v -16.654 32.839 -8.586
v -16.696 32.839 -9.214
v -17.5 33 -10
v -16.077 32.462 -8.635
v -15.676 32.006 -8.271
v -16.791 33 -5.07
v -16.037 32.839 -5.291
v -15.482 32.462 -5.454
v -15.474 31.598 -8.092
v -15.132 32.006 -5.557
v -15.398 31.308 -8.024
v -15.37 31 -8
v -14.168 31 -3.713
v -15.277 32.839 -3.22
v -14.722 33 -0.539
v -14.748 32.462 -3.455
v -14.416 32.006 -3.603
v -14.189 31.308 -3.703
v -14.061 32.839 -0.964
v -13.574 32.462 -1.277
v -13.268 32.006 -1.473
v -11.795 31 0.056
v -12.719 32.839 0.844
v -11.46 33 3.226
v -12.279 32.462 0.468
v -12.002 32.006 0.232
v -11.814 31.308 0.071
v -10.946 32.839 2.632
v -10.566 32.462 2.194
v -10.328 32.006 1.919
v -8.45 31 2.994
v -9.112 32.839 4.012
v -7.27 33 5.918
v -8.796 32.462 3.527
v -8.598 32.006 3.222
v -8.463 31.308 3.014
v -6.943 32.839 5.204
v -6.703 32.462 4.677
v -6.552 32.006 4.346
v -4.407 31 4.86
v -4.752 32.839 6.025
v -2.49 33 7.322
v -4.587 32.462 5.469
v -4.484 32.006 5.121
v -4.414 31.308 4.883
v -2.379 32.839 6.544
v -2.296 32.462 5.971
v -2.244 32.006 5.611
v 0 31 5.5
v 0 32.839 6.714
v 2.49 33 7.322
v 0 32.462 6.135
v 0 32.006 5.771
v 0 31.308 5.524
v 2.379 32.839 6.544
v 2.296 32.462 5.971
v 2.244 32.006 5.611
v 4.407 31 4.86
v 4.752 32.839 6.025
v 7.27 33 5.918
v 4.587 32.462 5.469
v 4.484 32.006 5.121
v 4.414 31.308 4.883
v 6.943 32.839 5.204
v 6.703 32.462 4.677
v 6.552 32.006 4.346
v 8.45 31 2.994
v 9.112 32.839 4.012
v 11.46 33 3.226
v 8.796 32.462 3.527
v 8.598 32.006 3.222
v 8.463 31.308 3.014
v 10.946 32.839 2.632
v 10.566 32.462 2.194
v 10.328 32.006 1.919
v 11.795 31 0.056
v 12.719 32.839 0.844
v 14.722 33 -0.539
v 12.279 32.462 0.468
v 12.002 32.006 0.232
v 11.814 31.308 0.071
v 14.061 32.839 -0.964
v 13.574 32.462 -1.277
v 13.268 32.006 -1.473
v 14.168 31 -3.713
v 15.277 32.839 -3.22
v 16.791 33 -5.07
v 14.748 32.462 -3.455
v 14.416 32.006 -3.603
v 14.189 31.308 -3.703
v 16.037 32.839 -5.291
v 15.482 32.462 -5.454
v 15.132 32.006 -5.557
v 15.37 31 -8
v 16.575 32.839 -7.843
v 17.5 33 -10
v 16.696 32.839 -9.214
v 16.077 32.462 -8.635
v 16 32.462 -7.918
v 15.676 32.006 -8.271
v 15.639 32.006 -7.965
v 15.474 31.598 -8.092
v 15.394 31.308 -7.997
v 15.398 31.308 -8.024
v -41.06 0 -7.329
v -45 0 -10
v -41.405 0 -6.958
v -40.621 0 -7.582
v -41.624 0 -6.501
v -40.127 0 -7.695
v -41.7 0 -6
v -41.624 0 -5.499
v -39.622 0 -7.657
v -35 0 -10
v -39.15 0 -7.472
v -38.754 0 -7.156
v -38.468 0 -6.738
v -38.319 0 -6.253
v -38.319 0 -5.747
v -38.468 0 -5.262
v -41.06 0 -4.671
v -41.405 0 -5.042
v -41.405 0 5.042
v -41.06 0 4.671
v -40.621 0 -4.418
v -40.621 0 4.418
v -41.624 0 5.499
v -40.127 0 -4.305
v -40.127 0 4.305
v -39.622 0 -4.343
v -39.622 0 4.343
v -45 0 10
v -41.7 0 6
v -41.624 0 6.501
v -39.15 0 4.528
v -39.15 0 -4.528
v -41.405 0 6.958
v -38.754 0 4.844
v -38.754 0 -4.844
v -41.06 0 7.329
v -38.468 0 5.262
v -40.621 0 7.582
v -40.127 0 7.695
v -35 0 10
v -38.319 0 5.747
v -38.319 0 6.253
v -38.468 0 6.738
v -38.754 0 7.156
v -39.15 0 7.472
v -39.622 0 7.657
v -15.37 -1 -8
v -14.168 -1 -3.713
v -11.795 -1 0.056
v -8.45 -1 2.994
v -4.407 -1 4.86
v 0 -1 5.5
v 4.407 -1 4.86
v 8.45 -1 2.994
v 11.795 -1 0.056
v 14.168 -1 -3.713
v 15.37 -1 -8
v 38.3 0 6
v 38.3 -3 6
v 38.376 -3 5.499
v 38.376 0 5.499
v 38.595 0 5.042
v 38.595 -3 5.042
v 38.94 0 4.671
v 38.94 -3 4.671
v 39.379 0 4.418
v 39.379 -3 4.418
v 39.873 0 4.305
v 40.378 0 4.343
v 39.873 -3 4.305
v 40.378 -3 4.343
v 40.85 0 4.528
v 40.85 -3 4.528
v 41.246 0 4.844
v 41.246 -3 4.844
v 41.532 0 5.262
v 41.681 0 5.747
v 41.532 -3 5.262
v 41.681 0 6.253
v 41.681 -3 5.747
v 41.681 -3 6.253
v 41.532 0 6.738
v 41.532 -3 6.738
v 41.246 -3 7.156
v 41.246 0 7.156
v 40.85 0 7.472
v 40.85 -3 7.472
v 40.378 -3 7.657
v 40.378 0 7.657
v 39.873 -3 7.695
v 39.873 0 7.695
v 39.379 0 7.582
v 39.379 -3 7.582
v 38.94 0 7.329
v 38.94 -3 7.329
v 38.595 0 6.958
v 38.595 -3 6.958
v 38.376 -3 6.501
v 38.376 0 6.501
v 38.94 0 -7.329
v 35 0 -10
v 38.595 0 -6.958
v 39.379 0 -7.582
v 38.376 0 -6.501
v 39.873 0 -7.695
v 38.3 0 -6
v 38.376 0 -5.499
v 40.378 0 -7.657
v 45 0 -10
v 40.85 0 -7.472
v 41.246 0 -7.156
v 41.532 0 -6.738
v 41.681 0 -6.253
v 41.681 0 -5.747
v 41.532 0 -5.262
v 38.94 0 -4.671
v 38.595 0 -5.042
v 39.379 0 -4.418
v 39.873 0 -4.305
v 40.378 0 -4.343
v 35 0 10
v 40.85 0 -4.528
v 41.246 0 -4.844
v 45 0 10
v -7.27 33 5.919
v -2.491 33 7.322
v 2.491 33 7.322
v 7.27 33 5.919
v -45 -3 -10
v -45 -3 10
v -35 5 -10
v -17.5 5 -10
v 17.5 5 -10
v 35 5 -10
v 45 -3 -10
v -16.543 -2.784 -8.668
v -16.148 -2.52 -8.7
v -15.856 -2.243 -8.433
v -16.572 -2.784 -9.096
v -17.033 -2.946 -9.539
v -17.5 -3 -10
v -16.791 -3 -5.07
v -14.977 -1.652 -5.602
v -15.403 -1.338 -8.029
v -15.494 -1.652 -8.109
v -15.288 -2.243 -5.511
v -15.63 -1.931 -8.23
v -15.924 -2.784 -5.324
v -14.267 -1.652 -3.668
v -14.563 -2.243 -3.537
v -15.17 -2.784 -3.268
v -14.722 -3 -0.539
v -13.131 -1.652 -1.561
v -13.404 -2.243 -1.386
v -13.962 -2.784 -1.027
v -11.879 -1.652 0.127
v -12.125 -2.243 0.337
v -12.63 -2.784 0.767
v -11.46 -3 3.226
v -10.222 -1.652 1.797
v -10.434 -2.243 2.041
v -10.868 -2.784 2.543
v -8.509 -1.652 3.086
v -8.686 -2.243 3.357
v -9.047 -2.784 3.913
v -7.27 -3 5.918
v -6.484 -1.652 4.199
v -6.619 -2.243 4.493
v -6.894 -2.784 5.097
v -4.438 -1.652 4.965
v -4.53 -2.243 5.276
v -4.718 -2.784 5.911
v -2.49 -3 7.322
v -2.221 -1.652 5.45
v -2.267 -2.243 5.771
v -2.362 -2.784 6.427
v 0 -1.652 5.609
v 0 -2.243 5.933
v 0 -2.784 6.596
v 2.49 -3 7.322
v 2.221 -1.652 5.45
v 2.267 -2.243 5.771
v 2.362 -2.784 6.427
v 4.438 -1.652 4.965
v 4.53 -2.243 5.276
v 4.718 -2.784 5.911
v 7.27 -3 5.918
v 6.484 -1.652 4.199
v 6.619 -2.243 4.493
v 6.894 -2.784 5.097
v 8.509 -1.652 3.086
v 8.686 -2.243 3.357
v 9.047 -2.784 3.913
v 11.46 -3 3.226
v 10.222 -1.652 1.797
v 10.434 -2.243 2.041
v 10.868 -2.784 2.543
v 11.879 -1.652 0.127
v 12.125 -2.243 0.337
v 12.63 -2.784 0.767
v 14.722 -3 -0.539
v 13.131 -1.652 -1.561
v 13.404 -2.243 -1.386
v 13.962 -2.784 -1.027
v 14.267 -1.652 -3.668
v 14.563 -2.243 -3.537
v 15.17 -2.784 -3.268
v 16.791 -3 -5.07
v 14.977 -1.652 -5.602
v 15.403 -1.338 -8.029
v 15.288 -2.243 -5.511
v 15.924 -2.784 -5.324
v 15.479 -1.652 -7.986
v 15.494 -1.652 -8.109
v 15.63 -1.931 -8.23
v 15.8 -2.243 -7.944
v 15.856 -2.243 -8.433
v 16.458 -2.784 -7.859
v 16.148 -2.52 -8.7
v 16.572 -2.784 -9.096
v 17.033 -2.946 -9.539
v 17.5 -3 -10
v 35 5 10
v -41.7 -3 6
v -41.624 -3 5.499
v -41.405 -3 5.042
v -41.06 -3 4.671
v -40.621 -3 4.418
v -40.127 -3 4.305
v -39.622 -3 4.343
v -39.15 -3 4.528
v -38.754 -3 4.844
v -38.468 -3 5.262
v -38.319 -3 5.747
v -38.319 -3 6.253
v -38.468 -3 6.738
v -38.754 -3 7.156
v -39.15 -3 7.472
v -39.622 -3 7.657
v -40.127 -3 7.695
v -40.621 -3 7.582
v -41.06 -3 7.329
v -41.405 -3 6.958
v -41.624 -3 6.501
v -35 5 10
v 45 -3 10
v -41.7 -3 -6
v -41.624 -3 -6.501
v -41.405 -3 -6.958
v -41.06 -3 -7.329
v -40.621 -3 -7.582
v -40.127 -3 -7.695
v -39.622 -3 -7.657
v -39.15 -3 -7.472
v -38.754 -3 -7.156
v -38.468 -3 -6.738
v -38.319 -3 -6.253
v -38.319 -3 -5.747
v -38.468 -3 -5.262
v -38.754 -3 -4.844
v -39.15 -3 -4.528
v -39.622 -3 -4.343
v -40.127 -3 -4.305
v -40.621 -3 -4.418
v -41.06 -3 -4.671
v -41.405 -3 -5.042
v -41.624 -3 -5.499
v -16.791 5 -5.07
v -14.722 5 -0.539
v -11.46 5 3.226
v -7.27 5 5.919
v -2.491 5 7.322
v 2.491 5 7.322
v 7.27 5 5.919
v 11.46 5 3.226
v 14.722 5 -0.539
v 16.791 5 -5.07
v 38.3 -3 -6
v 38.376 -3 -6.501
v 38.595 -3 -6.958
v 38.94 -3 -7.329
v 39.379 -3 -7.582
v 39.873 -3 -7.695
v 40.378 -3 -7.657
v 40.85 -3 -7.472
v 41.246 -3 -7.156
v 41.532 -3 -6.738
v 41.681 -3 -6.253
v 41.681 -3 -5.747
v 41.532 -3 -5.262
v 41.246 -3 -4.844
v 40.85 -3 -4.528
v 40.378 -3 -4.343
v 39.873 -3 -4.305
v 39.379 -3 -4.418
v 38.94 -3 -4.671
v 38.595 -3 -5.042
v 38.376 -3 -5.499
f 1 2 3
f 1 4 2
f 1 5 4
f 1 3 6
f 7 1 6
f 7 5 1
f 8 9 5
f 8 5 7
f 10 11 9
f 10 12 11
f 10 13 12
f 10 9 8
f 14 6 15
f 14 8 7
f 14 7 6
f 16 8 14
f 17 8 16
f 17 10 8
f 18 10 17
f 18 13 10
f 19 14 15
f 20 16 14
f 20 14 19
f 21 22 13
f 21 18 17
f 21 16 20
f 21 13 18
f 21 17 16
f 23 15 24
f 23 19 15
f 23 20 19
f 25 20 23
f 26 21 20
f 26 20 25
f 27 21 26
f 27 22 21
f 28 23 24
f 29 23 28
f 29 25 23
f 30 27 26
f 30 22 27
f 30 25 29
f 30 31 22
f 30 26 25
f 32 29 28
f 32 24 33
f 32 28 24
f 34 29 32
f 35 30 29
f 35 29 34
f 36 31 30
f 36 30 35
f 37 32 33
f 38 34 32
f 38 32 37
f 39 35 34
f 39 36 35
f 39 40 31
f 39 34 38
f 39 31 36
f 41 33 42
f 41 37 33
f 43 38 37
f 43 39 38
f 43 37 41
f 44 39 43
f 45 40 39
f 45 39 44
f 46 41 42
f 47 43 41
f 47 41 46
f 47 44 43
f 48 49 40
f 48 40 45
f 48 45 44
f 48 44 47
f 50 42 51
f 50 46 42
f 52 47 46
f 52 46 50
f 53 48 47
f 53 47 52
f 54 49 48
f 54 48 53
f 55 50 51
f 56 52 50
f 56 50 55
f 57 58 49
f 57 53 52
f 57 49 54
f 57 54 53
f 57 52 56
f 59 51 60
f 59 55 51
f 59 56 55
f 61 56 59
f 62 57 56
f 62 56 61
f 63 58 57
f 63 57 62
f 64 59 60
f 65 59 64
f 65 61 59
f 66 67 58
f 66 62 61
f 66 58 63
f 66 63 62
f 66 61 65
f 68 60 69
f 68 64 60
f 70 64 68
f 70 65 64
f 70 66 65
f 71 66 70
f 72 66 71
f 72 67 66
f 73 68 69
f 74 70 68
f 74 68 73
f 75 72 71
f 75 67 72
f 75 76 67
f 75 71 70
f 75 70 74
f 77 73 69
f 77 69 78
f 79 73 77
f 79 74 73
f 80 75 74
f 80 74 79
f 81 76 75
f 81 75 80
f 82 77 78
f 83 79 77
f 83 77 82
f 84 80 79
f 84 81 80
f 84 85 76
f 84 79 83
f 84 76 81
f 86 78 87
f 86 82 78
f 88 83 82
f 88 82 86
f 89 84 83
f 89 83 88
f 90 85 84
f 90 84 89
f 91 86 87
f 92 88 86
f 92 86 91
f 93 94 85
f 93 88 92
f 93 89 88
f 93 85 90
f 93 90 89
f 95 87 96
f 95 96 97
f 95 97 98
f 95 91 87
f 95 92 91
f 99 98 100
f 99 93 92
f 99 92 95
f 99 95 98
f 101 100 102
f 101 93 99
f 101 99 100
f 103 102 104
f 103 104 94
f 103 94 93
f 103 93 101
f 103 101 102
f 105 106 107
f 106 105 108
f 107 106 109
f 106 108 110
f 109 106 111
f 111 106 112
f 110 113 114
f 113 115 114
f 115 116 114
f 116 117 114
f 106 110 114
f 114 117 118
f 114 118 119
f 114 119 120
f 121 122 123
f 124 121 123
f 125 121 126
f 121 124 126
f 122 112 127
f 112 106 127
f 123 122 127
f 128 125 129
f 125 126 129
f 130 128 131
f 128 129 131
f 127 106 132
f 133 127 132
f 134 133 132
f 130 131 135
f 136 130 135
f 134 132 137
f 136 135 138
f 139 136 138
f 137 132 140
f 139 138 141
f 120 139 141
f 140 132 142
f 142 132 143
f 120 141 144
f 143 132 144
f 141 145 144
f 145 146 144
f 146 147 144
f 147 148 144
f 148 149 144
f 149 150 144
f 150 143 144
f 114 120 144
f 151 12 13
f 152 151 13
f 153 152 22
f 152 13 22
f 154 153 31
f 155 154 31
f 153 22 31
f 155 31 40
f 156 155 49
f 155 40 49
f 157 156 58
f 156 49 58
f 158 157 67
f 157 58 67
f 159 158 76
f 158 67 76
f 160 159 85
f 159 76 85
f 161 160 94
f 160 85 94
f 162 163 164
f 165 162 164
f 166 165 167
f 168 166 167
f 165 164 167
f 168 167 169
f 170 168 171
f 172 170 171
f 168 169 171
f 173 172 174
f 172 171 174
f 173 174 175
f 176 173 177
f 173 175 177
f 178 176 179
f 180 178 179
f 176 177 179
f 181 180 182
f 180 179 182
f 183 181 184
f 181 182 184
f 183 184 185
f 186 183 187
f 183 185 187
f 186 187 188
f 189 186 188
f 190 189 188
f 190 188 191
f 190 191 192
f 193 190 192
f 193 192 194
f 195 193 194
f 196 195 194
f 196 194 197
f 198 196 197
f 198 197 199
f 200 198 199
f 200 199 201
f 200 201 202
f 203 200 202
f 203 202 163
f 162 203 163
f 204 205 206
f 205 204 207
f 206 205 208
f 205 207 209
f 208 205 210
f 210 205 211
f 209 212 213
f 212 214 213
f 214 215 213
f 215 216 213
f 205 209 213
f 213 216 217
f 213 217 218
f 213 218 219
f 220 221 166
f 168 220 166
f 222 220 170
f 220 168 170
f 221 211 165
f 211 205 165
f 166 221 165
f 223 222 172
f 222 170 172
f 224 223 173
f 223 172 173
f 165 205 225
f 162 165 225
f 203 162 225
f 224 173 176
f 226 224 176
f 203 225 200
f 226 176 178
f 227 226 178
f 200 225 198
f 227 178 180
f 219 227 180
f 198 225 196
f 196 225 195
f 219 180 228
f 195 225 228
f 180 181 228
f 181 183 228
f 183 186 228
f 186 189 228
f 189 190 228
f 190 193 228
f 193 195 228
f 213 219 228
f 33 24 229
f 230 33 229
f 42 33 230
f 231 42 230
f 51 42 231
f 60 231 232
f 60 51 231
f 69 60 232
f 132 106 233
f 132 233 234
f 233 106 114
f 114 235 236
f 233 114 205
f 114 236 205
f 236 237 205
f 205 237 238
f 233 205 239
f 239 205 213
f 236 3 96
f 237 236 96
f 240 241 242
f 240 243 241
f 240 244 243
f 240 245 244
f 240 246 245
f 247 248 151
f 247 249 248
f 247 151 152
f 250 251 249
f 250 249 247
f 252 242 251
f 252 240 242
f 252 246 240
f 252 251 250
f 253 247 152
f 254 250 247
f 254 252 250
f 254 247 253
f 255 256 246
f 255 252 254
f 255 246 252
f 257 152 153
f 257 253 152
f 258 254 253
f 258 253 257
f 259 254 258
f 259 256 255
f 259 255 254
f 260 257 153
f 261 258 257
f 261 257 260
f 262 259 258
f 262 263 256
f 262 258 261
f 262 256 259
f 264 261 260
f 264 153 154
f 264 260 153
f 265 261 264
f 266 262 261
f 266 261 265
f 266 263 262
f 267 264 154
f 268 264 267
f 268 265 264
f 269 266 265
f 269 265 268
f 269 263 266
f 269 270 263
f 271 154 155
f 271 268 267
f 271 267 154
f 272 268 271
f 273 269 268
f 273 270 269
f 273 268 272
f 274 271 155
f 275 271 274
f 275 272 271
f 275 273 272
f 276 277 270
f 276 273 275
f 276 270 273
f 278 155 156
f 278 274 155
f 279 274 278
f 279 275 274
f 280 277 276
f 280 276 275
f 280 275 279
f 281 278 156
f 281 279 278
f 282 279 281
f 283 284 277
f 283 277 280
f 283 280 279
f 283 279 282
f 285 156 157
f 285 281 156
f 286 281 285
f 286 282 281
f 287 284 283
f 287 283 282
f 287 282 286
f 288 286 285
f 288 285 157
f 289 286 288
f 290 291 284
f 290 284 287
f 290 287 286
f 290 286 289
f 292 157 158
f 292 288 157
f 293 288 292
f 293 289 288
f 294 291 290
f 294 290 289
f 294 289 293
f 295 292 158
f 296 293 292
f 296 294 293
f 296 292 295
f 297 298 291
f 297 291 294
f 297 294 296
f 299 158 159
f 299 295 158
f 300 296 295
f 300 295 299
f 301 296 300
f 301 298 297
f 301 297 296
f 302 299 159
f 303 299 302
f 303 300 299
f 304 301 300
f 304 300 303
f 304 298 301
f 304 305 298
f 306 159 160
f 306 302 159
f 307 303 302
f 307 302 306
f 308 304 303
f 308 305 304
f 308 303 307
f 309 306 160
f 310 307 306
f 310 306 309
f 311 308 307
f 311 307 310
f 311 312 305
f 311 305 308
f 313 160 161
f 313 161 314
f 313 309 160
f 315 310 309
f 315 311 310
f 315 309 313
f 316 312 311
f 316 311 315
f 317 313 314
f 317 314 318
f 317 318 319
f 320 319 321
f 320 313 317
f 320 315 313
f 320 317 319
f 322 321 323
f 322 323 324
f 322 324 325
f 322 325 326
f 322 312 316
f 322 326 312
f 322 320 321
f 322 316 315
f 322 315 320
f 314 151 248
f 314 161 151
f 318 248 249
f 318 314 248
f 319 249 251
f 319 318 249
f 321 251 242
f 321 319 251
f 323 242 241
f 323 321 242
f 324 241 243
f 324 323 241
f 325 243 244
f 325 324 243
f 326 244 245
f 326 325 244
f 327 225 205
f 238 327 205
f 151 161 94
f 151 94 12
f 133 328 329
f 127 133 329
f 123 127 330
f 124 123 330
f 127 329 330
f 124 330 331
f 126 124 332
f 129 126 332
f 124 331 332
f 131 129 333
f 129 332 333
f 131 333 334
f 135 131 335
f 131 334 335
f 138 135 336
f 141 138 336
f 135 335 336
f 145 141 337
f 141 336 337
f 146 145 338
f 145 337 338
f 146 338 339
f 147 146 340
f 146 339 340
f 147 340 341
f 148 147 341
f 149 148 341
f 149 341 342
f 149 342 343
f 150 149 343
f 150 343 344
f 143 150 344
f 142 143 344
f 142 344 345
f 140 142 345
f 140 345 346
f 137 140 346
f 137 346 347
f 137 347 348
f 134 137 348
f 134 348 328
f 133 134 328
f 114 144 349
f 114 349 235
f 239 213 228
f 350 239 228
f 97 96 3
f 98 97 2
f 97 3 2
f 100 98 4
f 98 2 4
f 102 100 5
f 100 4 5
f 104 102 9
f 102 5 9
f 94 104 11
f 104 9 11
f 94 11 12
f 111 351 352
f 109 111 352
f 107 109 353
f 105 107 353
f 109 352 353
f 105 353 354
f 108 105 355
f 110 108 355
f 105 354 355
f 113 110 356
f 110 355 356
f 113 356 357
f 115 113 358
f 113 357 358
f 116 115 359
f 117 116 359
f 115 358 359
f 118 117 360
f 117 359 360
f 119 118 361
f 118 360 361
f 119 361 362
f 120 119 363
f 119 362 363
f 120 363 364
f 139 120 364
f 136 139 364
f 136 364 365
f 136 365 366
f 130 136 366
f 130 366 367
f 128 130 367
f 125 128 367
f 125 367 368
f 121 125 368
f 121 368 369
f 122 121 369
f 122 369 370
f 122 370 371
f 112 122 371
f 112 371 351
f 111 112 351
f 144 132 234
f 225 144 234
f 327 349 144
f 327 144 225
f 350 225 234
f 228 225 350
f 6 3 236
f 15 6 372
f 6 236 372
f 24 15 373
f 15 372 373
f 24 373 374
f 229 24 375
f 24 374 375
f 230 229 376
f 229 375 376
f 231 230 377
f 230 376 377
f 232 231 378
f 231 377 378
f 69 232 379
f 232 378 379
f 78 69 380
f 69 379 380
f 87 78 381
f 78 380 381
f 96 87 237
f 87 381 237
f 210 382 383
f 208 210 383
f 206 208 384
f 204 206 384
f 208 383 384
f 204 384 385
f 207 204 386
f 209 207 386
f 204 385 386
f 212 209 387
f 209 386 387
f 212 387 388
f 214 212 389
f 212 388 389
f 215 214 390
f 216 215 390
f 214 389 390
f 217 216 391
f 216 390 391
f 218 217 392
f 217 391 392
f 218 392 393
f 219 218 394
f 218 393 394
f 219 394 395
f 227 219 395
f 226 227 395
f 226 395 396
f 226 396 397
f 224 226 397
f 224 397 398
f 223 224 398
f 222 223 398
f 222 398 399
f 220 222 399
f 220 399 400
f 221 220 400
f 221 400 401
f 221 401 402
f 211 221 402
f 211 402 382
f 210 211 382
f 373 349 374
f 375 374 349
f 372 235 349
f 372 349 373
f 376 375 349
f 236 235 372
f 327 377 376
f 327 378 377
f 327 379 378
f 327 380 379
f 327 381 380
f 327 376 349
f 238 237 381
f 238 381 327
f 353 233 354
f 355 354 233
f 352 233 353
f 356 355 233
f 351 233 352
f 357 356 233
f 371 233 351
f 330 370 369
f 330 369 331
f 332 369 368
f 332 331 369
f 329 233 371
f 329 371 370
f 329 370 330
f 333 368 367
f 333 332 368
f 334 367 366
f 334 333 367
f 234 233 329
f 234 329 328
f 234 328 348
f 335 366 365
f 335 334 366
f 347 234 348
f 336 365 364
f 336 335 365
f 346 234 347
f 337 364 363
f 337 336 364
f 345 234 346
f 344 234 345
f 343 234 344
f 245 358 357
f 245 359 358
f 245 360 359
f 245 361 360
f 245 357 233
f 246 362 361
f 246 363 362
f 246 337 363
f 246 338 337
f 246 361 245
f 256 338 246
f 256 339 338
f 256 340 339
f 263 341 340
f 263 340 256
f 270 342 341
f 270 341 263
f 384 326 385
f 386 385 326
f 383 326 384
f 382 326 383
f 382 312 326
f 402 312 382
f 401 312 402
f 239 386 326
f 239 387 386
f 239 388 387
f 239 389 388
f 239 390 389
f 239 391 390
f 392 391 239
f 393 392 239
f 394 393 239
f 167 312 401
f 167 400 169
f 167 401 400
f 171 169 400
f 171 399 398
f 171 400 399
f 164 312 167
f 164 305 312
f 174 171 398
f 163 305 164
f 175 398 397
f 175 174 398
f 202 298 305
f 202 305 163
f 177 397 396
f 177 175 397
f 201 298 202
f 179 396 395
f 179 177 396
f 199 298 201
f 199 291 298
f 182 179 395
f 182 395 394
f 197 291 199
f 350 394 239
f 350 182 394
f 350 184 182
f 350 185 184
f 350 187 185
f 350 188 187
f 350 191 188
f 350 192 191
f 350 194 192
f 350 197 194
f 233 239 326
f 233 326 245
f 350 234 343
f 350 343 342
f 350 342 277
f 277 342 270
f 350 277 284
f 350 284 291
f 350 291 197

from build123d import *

# Parameters (mm, degrees)
SKETCH1_W                = 70
SKETCH1_H                = 20
BOSS_EXTRUDE1_DEPTH      = 5
SKETCH2_W                = 90
SKETCH2_H                = 20
BOSS_EXTRUDE2_DEPTH      = 3
BOSS_EXTRUDE3_DEPTH      = 28
CUT_EXTRUDE1_DEPTH       = 59.489315264
FILLET1_R                = 2
FILLET2_R                = 2
M3_CLEARANCE_HOLE1_D     = 3.4
M3_CLEARANCE_HOLE1_DEPTH = 10
M3_CLEARANCE_HOLE1_TIP   = 1.021463052


with BuildPart() as part:
    # Sketch1 → Boss-Extrude1 (new body)
    with BuildSketch(Plane(origin=(0, 0, 0), x_dir=(1, 0, 0), z_dir=(0, 1, 0))):
        Rectangle(SKETCH1_W, SKETCH1_H)
    extrude(amount=BOSS_EXTRUDE1_DEPTH)

    # Sketch2 → Boss-Extrude2 (add)
    with BuildSketch(Plane.XZ):
        Rectangle(SKETCH2_W, SKETCH2_H)
    extrude(amount=BOSS_EXTRUDE2_DEPTH)

    # Sketch4 → Boss-Extrude3 (add)
    with BuildSketch(Plane(origin=(0, 5, 0), x_dir=(1, 0, 0), z_dir=(0, 1, 0))):
        with BuildLine():
            Line((17.5, 10), (-17.5, 10))
            ThreePointArc((-17.5, 10), (0, -7.5), (17.5, 10))
        make_face()
    extrude(amount=BOSS_EXTRUDE3_DEPTH)

    # Sketch6 → Cut-Extrude1 (cut, through all)
    with BuildSketch(Plane(origin=(0, 33, 0), x_dir=(1, 0, 0), z_dir=(0, 1, 0))):
        with BuildLine():
            Line((15.370426149, 8), (-15.370426149, 8))
            ThreePointArc((-15.370426149, 8), (0, -5.5), (15.370426149, 8))
        make_face()
    extrude(amount=-CUT_EXTRUDE1_DEPTH, mode=Mode.SUBTRACT)

    # Fillet1
    fillet1_edges = [part.edges().sort_by_distance(p)[0] for p in [
        (0, 33, 5.5),
        (0, 33, -8),
    ]]
    fillet(fillet1_edges, radius=FILLET1_R - 0.0001)  # a hair under: the kernel refuses the full size

    # Fillet2
    fillet2_edges = [part.edges().sort_by_distance(p)[0] for p in [
        (0, -3, 5.5),
        (0, -3, -8),
    ]]
    fillet(fillet2_edges, radius=FILLET2_R - 0.0001)  # a hair under: the kernel refuses the full size

    # M3 Clearance Hole1
    with Locations(Plane(origin=(0, 0, 0), x_dir=(1, 0, 0), z_dir=(0, 1, 0))):
        with Locations((-40, 6), (-40, -6), (40, 6), (40, -6)):
            Hole(M3_CLEARANCE_HOLE1_D / 2, depth=M3_CLEARANCE_HOLE1_DEPTH)
            with Locations((0, 0, -(M3_CLEARANCE_HOLE1_DEPTH + M3_CLEARANCE_HOLE1_TIP / 2))):  # 118° drill point
                Cone(0, M3_CLEARANCE_HOLE1_D / 2, M3_CLEARANCE_HOLE1_TIP, mode=Mode.SUBTRACT)


solid = part.part
